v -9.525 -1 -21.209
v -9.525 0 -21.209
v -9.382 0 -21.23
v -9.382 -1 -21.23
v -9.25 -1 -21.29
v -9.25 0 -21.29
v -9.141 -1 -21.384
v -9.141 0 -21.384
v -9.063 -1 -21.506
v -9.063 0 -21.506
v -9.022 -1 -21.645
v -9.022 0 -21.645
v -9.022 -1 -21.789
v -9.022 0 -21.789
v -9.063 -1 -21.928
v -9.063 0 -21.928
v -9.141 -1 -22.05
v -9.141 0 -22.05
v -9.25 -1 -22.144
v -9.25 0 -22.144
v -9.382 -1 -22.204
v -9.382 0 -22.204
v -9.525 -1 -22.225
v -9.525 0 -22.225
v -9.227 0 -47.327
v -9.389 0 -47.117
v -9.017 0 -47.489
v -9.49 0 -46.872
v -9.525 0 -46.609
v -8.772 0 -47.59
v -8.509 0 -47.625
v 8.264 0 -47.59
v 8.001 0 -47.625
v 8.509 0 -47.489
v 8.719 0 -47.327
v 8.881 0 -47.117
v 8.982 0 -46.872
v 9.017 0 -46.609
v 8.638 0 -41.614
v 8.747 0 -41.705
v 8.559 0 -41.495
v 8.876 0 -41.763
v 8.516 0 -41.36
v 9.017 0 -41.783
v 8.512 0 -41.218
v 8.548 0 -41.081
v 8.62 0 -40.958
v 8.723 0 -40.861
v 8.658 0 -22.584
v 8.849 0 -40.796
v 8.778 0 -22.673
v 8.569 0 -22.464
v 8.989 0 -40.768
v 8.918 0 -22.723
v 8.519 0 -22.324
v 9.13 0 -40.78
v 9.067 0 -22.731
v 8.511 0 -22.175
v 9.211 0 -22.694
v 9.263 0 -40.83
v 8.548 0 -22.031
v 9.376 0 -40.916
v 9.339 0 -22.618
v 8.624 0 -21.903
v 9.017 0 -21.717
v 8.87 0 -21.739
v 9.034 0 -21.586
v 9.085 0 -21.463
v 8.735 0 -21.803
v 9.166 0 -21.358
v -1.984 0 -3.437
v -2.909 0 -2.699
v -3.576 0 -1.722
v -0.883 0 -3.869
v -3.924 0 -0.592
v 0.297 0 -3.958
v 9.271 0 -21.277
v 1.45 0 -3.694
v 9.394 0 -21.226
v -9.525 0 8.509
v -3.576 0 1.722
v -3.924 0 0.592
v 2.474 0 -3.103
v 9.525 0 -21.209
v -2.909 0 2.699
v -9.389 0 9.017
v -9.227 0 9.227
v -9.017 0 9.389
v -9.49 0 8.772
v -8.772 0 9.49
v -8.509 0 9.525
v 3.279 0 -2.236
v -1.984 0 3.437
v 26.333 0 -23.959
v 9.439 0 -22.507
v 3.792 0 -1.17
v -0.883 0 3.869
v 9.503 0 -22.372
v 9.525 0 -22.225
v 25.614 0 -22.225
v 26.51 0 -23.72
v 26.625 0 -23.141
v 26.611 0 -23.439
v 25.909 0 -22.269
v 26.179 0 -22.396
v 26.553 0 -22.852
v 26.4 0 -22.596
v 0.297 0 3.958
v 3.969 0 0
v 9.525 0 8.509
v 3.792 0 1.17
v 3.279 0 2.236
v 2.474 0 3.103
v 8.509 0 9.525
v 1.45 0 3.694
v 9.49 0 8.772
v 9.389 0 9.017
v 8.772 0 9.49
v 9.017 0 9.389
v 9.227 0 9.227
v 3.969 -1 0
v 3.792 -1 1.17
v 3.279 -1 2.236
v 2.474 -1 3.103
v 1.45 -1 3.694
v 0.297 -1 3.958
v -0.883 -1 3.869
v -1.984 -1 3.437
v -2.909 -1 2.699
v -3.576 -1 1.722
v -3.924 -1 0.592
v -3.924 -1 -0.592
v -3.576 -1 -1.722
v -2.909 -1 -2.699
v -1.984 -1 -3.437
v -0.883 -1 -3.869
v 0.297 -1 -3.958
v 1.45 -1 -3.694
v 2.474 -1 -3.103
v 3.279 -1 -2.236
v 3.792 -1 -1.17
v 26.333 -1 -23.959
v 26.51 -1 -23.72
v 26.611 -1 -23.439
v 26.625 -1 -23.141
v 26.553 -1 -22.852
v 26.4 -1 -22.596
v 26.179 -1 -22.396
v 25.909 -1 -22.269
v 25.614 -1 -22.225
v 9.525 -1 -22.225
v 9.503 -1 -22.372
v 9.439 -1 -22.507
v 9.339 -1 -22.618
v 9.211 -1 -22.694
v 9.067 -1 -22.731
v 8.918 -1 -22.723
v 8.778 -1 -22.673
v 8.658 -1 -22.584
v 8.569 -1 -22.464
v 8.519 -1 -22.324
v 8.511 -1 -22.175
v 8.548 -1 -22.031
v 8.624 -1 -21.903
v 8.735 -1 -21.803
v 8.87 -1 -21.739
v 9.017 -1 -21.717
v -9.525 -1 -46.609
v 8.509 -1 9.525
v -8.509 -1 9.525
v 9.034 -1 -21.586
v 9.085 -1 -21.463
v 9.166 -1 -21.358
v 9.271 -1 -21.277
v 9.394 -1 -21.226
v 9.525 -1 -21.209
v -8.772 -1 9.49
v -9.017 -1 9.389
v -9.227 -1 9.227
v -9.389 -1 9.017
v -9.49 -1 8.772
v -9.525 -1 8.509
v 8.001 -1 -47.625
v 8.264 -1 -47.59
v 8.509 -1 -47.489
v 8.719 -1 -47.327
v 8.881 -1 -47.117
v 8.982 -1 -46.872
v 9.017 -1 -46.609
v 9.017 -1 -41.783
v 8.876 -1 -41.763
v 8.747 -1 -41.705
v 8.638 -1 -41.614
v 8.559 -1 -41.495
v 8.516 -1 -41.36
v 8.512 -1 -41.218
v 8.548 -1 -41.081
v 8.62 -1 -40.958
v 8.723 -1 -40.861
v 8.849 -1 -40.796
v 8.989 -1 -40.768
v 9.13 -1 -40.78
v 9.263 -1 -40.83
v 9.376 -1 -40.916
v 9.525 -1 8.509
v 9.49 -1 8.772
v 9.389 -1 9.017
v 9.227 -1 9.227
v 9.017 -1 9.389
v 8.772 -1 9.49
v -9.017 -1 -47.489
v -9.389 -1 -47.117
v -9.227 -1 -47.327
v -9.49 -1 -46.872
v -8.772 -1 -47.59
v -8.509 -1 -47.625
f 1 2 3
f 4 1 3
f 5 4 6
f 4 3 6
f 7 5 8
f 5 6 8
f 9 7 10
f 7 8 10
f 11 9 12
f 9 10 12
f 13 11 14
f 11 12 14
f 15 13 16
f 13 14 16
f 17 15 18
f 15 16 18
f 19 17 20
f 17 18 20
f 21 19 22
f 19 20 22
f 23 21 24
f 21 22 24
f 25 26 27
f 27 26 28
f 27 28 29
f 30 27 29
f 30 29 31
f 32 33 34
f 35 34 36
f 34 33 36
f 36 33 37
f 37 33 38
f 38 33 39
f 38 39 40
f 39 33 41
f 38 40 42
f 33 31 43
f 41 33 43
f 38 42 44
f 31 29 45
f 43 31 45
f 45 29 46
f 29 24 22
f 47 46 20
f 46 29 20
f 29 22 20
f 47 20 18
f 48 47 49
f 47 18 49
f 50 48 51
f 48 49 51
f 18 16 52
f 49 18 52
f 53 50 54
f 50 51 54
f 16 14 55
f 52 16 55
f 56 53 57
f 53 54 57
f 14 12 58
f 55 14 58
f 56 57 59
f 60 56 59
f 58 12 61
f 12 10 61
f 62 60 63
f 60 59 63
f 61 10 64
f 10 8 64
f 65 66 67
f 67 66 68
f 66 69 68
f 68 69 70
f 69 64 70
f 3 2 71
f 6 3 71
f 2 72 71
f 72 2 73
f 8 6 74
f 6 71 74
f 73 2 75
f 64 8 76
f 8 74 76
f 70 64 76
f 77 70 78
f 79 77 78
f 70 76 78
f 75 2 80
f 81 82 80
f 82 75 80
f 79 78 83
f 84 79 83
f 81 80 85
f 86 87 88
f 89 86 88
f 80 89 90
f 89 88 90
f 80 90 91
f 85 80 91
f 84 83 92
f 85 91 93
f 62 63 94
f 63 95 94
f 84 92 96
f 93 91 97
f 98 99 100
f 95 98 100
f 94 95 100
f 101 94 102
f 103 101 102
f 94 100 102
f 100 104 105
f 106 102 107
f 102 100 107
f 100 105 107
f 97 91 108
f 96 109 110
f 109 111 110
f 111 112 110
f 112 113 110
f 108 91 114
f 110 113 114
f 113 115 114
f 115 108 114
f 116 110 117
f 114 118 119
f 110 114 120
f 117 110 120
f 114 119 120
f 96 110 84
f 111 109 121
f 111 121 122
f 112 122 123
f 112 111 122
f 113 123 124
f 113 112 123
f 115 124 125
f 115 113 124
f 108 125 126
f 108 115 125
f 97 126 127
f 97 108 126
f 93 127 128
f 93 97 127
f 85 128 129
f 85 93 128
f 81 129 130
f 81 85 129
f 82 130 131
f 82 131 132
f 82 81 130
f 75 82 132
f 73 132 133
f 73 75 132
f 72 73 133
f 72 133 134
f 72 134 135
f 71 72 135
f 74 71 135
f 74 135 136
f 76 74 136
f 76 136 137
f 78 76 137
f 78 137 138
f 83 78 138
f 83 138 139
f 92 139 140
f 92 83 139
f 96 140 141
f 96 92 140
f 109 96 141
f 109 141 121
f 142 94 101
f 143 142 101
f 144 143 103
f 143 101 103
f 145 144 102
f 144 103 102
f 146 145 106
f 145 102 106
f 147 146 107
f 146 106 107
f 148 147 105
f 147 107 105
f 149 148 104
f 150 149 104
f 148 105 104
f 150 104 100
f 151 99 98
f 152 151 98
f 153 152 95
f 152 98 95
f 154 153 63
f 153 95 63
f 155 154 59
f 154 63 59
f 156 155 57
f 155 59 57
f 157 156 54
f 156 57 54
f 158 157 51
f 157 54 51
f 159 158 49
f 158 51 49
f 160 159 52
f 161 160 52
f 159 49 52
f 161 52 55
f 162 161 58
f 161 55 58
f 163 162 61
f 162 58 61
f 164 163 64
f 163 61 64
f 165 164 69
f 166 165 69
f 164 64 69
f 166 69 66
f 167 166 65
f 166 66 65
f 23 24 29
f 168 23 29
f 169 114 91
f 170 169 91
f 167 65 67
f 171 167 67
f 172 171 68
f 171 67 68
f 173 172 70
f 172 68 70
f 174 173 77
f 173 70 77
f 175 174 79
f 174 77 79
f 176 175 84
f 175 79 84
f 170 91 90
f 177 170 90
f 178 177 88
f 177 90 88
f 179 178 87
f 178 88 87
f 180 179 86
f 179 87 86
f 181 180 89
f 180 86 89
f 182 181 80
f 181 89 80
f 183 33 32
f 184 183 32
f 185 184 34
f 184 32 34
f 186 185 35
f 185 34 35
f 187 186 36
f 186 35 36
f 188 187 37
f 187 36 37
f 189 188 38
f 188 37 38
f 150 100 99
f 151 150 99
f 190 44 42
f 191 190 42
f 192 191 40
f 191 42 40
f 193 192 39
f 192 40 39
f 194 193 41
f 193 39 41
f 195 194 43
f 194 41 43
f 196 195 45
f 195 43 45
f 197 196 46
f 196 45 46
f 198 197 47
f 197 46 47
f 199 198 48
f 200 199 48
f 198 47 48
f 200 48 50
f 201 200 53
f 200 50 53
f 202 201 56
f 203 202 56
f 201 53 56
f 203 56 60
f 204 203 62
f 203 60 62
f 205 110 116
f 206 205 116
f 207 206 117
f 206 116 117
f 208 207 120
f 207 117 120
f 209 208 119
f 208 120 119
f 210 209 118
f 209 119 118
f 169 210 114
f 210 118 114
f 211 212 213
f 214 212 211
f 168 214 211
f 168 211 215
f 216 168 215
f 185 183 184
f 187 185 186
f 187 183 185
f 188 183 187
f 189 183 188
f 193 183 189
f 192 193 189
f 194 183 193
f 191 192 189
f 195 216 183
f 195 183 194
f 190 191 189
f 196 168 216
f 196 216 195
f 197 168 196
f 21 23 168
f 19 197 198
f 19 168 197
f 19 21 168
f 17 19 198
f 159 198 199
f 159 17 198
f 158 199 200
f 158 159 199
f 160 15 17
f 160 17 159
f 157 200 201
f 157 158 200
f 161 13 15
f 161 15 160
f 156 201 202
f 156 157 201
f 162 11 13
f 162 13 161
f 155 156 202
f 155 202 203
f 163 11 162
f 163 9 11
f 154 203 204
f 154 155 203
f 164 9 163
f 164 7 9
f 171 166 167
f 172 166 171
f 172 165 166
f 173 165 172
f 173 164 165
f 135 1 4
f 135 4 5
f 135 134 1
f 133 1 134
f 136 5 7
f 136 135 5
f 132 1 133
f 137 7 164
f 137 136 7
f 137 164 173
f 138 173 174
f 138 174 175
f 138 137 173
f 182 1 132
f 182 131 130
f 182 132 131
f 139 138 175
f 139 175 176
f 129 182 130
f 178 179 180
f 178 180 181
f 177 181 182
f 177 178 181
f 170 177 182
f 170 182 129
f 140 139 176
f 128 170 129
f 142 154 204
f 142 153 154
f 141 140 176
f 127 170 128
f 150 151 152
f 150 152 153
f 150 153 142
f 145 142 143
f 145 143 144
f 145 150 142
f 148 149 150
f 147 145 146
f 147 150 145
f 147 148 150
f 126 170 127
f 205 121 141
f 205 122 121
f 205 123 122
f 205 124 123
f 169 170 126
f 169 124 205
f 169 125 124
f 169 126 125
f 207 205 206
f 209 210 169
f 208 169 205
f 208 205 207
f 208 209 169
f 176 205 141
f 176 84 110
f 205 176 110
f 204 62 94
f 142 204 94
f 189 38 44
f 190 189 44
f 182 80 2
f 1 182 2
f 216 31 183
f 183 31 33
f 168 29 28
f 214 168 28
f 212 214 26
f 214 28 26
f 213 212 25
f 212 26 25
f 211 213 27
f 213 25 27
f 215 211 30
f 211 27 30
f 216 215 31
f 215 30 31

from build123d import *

# Parameters (mm, degrees)
F0_R     = 3.96875
F1_DEPTH = 1


with BuildPart() as f1:
    # F0 (on Front) → F1 (new body)
    with BuildSketch(Plane.XZ):
        with BuildLine():
            Line((8.509, 9.525), (0, 9.525))
            Line((0, 9.525), (-8.509, 9.525))
            ThreePointArc((-8.509, 9.525), (-9.22742, 9.22742), (-9.525, 8.509))
            Line((-9.525, 8.509), (-9.525, -21.209))
            ThreePointArc((-9.525, -21.209), (-9.017, -21.717), (-9.525, -22.225))
            Line((-9.525, -22.225), (-9.525, -46.609))
            ThreePointArc((-9.525, -46.609), (-9.22742, -47.32742), (-8.509, -47.625))
            Line((-8.509, -47.625), (0, -47.625))
            Line((0, -47.625), (8.001, -47.625))
            ThreePointArc((8.001, -47.625), (8.71942, -47.32742), (9.017, -46.609))
            Line((9.017, -46.609), (9.017, -41.783))
            ThreePointArc((9.017, -41.783), (8.547669, -41.080597), (9.37621, -40.91579))
            Line((9.37621, -40.91579), (26.33258, -23.95942))
            ThreePointArc((26.33258, -23.95942), (26.552821, -22.852194), (25.614159, -22.225))
            Line((25.614159, -22.225), (9.525, -22.225))
            ThreePointArc((9.525, -22.225), (8.65779, -22.58421), (9.017, -21.717))
            ThreePointArc((9.017, -21.717), (9.16579, -21.35779), (9.525, -21.209))
            Line((9.525, -21.209), (9.525, 8.509))
            ThreePointArc((9.525, 8.509), (9.22742, 9.22742), (8.509, 9.525))
        make_face()
        Circle(F0_R, mode=Mode.SUBTRACT)
    extrude(amount=F1_DEPTH)


solid = f1.part
